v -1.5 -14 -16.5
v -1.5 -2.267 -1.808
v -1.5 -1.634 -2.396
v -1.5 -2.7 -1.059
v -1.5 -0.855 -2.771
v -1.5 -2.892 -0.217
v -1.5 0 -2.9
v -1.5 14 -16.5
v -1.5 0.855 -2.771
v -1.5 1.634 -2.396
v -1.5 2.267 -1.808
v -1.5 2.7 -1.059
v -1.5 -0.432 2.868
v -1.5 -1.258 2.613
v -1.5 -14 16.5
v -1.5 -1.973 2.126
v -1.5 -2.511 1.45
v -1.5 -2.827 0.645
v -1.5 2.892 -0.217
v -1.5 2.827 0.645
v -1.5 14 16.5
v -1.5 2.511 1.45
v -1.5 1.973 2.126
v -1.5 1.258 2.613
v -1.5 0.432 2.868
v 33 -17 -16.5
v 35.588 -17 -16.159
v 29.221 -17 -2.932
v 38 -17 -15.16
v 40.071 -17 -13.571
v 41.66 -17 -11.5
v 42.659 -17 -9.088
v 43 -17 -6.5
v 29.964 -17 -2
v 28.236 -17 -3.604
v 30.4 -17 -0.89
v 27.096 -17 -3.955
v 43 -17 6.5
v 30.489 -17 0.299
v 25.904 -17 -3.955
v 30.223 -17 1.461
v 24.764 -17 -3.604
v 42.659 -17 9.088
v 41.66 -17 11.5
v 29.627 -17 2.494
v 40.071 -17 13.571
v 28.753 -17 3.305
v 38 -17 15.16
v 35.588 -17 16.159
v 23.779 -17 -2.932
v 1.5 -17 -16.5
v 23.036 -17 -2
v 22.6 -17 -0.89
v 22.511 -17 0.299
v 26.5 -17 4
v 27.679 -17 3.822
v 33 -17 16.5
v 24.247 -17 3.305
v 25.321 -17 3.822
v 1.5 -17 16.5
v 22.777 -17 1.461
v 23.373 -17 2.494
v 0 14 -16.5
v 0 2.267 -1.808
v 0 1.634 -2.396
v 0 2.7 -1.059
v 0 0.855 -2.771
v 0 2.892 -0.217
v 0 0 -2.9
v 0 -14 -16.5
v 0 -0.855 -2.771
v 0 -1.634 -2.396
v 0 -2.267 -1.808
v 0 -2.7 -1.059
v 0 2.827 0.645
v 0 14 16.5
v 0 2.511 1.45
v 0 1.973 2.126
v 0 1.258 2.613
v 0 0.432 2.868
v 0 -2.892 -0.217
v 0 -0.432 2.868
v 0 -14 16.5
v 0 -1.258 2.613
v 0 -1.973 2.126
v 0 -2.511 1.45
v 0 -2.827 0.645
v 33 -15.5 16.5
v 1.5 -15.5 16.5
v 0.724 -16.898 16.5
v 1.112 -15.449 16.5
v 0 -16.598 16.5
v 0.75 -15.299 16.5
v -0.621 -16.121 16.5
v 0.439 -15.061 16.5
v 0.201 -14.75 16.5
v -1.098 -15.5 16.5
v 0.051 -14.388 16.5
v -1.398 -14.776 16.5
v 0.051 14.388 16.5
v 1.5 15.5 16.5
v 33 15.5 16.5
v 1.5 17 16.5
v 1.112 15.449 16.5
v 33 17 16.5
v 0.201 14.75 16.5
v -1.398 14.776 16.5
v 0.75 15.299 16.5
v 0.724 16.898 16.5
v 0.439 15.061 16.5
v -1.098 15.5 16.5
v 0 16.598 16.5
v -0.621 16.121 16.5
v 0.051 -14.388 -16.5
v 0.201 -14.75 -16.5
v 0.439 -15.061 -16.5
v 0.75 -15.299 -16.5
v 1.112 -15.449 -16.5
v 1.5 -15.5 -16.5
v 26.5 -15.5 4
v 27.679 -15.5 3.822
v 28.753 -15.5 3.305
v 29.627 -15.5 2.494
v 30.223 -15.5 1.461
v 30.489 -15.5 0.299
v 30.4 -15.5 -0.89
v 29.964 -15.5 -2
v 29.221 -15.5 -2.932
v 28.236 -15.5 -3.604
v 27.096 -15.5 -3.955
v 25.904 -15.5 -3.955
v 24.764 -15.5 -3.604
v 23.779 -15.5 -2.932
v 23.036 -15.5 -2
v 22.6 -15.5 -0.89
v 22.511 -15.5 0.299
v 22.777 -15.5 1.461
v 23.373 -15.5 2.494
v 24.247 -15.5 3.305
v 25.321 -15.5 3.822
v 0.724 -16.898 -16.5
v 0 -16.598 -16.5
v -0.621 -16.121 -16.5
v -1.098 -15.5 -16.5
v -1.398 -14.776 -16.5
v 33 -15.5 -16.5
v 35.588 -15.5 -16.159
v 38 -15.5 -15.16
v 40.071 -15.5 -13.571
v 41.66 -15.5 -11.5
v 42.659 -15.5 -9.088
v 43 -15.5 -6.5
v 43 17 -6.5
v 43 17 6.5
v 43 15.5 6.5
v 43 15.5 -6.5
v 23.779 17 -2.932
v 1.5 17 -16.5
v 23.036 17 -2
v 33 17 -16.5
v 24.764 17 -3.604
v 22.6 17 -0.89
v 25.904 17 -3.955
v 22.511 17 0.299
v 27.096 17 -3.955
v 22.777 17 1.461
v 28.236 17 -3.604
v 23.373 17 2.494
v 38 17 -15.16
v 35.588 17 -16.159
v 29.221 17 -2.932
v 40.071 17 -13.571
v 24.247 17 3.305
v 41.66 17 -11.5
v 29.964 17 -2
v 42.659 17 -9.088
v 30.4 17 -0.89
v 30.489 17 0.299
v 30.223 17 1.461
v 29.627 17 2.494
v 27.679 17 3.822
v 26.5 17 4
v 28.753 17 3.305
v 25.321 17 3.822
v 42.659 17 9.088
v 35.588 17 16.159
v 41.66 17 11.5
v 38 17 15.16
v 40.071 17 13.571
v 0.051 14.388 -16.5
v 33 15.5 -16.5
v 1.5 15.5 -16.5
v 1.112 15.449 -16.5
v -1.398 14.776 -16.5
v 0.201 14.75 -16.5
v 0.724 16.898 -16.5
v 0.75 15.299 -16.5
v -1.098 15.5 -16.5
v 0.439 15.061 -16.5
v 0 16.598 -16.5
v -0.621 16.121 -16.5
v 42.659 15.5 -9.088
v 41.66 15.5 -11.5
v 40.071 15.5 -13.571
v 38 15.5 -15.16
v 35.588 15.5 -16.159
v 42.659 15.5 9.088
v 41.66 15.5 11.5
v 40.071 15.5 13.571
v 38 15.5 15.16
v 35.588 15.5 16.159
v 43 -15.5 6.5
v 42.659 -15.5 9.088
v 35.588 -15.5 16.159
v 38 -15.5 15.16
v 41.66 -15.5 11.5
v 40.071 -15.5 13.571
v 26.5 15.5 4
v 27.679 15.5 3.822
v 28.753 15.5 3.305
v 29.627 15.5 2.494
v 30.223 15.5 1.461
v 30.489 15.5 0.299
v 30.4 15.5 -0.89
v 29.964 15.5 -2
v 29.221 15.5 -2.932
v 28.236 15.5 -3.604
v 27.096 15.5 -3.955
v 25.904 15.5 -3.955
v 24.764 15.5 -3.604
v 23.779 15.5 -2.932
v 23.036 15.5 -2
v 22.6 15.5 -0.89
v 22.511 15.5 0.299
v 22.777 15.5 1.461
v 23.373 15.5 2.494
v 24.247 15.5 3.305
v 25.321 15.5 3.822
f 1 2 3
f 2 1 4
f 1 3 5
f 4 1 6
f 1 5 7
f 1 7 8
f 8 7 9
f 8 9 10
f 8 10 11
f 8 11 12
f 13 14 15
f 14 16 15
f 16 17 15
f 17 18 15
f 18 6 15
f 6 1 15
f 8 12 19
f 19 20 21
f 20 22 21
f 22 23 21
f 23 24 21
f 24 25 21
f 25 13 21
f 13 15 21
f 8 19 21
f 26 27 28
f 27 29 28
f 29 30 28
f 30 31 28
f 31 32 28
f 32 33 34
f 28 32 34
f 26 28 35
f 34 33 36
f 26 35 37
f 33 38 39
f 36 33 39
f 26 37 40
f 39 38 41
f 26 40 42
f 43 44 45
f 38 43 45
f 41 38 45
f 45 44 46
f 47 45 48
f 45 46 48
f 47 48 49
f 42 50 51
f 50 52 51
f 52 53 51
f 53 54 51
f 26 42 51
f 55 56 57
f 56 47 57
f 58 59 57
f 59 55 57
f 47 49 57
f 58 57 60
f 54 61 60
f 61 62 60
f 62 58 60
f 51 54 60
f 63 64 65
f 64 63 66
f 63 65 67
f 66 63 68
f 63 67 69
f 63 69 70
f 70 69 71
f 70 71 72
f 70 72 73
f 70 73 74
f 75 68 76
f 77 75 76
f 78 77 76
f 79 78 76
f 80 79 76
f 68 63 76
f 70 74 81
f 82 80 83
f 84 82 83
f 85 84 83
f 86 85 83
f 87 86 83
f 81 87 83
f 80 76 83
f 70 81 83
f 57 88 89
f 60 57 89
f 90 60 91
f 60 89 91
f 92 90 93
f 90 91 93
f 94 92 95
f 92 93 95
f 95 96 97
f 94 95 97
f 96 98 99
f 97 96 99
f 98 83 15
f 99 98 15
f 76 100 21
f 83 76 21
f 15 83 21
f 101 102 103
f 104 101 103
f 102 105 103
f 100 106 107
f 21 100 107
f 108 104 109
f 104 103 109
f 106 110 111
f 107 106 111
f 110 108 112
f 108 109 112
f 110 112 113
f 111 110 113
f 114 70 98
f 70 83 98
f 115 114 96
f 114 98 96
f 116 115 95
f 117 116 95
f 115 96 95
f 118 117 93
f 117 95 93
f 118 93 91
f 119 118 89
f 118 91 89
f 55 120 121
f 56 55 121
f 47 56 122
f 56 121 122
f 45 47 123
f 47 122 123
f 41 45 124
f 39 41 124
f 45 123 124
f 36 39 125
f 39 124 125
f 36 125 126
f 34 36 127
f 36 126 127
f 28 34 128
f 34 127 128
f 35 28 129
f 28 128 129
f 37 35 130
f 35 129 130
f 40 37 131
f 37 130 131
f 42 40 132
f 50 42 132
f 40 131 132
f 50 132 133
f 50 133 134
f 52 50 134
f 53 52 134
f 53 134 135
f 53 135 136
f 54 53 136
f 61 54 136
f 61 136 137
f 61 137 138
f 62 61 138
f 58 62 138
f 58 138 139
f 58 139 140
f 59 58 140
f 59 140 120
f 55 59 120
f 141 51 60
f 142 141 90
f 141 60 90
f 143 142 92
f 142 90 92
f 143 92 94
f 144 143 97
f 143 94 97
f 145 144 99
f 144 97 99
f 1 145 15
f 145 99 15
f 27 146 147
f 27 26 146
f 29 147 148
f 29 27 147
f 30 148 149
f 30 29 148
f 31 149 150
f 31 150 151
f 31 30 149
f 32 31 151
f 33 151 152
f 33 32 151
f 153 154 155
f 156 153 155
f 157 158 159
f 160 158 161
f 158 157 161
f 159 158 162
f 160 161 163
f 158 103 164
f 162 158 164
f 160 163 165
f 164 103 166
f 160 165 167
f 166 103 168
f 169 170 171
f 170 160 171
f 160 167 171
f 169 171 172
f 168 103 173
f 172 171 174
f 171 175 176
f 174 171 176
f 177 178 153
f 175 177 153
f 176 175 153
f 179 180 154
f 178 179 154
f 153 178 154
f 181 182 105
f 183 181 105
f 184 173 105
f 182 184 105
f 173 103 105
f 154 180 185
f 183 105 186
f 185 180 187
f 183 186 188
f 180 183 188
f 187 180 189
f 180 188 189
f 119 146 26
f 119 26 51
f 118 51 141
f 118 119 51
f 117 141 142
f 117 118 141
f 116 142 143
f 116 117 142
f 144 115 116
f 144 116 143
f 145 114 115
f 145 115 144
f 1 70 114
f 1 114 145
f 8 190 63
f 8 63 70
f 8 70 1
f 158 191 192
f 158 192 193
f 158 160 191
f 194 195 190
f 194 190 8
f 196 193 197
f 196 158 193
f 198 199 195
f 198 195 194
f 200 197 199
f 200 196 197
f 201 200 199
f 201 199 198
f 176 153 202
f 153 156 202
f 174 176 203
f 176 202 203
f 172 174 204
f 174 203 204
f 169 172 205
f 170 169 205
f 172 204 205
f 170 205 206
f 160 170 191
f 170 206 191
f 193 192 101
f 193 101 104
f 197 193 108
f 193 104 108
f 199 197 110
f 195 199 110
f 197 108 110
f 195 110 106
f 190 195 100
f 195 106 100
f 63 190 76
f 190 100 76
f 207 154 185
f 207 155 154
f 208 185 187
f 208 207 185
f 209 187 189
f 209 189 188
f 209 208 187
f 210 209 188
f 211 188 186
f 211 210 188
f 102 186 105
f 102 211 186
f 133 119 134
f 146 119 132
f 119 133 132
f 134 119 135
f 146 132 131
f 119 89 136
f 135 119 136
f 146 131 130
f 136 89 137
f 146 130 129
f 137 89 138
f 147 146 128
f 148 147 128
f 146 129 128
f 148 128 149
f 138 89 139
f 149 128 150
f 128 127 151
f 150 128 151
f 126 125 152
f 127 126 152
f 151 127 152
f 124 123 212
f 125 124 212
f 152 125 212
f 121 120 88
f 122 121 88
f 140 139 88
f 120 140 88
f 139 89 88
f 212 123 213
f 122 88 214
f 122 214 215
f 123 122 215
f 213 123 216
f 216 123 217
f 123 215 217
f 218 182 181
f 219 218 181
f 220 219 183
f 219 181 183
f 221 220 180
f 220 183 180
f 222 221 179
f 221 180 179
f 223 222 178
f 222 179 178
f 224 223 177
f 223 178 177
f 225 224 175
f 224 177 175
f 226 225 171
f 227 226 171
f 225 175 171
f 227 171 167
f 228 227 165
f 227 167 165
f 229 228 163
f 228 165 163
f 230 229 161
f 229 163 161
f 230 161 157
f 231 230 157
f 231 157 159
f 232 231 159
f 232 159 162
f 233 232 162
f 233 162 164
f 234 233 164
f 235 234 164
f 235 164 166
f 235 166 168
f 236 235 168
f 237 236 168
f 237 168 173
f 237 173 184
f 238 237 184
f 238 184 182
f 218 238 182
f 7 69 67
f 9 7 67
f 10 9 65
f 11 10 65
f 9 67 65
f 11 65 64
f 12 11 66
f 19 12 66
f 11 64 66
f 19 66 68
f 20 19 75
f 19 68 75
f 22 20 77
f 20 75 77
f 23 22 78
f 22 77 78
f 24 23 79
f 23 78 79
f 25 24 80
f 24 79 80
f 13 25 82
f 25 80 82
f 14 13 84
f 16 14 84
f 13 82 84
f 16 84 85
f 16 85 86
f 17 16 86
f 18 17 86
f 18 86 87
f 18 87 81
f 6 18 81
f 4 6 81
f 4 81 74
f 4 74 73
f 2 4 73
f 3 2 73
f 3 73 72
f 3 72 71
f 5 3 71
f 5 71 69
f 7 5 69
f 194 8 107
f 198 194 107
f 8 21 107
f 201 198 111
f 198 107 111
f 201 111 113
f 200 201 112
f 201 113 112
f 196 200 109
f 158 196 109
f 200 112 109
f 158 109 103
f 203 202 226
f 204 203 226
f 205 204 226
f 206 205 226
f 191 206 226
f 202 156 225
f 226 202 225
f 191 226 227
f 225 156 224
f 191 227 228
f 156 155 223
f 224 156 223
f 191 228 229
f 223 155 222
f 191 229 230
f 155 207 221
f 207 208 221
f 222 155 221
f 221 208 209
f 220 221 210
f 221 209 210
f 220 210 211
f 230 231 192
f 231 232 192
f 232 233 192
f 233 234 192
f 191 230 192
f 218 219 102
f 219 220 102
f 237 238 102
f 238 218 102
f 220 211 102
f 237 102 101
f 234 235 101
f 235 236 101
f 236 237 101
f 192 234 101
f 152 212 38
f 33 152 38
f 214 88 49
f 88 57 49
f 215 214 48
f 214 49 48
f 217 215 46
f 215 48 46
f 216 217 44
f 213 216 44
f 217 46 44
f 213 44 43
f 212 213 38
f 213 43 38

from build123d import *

# Parameters (mm, degrees)
BASE_FLANGE1_DEPTH   = 16.5
SKETCH6_R            = 4
CUT_EXTRUDE1_DEPTH   = 58.247270677
M5_CLEARANCE_HOLE1_D = 5.8
FILLET1_R            = 10


# Sheet-metal steps are written as plain solids
with BuildPart() as part:
    # Sketch1 → Base-Flange1 (new, symmetric)
    with BuildSketch(Plane.XY):
        with BuildLine():
            Line((43, 15.5), (1.5, 15.5))
            ThreePointArc((1.5, 15.5), (0.439339828, 15.060660172), (0, 14))
            Line((0, 14), (0, -14))
            ThreePointArc((0, -14), (0.439339828, -15.060660172), (1.5, -15.5))
            Line((1.5, -15.5), (43, -15.5))
            Line((43, -15.5), (43, -17))
            Line((43, -17), (1.5, -17))
            ThreePointArc((1.5, -17), (-0.621320344, -16.121320344), (-1.5, -14))
            Line((-1.5, -14), (-1.5, 14))
            ThreePointArc((-1.5, 14), (-0.621320344, 16.121320344), (1.5, 17))
            Line((1.5, 17), (43, 17))
            Line((43, 17), (43, 15.5))
        make_face()
    extrude(amount=BASE_FLANGE1_DEPTH, both=True)

    # Sketch6 → Cut-Extrude1 (cut, through all)
    with BuildSketch(Plane(origin=(0, 17, 0), x_dir=(1, 0, 0), z_dir=(0, 1, 0))):
        with Locations(Location((26.5, 0, 0), (0, 0, 270))):
            Circle(SKETCH6_R)
    extrude(amount=-CUT_EXTRUDE1_DEPTH, mode=Mode.SUBTRACT)

    # M5 Clearance Hole1 (through all)
    with Locations(Plane.ZY.offset(1.5)):
        with Locations((0, 0)):
            Hole(M5_CLEARANCE_HOLE1_D / 2)

    # Fillet1
    fillet1_edges = [part.edges().sort_by_distance(p)[0] for p in [
        (43, 16.25, -16.5),
        (43, -16.25, -16.5),
        (43, 16.25, 16.5),
        (43, -16.25, 16.5),
    ]]
    fillet(fillet1_edges, radius=FILLET1_R)


solid = part.part
